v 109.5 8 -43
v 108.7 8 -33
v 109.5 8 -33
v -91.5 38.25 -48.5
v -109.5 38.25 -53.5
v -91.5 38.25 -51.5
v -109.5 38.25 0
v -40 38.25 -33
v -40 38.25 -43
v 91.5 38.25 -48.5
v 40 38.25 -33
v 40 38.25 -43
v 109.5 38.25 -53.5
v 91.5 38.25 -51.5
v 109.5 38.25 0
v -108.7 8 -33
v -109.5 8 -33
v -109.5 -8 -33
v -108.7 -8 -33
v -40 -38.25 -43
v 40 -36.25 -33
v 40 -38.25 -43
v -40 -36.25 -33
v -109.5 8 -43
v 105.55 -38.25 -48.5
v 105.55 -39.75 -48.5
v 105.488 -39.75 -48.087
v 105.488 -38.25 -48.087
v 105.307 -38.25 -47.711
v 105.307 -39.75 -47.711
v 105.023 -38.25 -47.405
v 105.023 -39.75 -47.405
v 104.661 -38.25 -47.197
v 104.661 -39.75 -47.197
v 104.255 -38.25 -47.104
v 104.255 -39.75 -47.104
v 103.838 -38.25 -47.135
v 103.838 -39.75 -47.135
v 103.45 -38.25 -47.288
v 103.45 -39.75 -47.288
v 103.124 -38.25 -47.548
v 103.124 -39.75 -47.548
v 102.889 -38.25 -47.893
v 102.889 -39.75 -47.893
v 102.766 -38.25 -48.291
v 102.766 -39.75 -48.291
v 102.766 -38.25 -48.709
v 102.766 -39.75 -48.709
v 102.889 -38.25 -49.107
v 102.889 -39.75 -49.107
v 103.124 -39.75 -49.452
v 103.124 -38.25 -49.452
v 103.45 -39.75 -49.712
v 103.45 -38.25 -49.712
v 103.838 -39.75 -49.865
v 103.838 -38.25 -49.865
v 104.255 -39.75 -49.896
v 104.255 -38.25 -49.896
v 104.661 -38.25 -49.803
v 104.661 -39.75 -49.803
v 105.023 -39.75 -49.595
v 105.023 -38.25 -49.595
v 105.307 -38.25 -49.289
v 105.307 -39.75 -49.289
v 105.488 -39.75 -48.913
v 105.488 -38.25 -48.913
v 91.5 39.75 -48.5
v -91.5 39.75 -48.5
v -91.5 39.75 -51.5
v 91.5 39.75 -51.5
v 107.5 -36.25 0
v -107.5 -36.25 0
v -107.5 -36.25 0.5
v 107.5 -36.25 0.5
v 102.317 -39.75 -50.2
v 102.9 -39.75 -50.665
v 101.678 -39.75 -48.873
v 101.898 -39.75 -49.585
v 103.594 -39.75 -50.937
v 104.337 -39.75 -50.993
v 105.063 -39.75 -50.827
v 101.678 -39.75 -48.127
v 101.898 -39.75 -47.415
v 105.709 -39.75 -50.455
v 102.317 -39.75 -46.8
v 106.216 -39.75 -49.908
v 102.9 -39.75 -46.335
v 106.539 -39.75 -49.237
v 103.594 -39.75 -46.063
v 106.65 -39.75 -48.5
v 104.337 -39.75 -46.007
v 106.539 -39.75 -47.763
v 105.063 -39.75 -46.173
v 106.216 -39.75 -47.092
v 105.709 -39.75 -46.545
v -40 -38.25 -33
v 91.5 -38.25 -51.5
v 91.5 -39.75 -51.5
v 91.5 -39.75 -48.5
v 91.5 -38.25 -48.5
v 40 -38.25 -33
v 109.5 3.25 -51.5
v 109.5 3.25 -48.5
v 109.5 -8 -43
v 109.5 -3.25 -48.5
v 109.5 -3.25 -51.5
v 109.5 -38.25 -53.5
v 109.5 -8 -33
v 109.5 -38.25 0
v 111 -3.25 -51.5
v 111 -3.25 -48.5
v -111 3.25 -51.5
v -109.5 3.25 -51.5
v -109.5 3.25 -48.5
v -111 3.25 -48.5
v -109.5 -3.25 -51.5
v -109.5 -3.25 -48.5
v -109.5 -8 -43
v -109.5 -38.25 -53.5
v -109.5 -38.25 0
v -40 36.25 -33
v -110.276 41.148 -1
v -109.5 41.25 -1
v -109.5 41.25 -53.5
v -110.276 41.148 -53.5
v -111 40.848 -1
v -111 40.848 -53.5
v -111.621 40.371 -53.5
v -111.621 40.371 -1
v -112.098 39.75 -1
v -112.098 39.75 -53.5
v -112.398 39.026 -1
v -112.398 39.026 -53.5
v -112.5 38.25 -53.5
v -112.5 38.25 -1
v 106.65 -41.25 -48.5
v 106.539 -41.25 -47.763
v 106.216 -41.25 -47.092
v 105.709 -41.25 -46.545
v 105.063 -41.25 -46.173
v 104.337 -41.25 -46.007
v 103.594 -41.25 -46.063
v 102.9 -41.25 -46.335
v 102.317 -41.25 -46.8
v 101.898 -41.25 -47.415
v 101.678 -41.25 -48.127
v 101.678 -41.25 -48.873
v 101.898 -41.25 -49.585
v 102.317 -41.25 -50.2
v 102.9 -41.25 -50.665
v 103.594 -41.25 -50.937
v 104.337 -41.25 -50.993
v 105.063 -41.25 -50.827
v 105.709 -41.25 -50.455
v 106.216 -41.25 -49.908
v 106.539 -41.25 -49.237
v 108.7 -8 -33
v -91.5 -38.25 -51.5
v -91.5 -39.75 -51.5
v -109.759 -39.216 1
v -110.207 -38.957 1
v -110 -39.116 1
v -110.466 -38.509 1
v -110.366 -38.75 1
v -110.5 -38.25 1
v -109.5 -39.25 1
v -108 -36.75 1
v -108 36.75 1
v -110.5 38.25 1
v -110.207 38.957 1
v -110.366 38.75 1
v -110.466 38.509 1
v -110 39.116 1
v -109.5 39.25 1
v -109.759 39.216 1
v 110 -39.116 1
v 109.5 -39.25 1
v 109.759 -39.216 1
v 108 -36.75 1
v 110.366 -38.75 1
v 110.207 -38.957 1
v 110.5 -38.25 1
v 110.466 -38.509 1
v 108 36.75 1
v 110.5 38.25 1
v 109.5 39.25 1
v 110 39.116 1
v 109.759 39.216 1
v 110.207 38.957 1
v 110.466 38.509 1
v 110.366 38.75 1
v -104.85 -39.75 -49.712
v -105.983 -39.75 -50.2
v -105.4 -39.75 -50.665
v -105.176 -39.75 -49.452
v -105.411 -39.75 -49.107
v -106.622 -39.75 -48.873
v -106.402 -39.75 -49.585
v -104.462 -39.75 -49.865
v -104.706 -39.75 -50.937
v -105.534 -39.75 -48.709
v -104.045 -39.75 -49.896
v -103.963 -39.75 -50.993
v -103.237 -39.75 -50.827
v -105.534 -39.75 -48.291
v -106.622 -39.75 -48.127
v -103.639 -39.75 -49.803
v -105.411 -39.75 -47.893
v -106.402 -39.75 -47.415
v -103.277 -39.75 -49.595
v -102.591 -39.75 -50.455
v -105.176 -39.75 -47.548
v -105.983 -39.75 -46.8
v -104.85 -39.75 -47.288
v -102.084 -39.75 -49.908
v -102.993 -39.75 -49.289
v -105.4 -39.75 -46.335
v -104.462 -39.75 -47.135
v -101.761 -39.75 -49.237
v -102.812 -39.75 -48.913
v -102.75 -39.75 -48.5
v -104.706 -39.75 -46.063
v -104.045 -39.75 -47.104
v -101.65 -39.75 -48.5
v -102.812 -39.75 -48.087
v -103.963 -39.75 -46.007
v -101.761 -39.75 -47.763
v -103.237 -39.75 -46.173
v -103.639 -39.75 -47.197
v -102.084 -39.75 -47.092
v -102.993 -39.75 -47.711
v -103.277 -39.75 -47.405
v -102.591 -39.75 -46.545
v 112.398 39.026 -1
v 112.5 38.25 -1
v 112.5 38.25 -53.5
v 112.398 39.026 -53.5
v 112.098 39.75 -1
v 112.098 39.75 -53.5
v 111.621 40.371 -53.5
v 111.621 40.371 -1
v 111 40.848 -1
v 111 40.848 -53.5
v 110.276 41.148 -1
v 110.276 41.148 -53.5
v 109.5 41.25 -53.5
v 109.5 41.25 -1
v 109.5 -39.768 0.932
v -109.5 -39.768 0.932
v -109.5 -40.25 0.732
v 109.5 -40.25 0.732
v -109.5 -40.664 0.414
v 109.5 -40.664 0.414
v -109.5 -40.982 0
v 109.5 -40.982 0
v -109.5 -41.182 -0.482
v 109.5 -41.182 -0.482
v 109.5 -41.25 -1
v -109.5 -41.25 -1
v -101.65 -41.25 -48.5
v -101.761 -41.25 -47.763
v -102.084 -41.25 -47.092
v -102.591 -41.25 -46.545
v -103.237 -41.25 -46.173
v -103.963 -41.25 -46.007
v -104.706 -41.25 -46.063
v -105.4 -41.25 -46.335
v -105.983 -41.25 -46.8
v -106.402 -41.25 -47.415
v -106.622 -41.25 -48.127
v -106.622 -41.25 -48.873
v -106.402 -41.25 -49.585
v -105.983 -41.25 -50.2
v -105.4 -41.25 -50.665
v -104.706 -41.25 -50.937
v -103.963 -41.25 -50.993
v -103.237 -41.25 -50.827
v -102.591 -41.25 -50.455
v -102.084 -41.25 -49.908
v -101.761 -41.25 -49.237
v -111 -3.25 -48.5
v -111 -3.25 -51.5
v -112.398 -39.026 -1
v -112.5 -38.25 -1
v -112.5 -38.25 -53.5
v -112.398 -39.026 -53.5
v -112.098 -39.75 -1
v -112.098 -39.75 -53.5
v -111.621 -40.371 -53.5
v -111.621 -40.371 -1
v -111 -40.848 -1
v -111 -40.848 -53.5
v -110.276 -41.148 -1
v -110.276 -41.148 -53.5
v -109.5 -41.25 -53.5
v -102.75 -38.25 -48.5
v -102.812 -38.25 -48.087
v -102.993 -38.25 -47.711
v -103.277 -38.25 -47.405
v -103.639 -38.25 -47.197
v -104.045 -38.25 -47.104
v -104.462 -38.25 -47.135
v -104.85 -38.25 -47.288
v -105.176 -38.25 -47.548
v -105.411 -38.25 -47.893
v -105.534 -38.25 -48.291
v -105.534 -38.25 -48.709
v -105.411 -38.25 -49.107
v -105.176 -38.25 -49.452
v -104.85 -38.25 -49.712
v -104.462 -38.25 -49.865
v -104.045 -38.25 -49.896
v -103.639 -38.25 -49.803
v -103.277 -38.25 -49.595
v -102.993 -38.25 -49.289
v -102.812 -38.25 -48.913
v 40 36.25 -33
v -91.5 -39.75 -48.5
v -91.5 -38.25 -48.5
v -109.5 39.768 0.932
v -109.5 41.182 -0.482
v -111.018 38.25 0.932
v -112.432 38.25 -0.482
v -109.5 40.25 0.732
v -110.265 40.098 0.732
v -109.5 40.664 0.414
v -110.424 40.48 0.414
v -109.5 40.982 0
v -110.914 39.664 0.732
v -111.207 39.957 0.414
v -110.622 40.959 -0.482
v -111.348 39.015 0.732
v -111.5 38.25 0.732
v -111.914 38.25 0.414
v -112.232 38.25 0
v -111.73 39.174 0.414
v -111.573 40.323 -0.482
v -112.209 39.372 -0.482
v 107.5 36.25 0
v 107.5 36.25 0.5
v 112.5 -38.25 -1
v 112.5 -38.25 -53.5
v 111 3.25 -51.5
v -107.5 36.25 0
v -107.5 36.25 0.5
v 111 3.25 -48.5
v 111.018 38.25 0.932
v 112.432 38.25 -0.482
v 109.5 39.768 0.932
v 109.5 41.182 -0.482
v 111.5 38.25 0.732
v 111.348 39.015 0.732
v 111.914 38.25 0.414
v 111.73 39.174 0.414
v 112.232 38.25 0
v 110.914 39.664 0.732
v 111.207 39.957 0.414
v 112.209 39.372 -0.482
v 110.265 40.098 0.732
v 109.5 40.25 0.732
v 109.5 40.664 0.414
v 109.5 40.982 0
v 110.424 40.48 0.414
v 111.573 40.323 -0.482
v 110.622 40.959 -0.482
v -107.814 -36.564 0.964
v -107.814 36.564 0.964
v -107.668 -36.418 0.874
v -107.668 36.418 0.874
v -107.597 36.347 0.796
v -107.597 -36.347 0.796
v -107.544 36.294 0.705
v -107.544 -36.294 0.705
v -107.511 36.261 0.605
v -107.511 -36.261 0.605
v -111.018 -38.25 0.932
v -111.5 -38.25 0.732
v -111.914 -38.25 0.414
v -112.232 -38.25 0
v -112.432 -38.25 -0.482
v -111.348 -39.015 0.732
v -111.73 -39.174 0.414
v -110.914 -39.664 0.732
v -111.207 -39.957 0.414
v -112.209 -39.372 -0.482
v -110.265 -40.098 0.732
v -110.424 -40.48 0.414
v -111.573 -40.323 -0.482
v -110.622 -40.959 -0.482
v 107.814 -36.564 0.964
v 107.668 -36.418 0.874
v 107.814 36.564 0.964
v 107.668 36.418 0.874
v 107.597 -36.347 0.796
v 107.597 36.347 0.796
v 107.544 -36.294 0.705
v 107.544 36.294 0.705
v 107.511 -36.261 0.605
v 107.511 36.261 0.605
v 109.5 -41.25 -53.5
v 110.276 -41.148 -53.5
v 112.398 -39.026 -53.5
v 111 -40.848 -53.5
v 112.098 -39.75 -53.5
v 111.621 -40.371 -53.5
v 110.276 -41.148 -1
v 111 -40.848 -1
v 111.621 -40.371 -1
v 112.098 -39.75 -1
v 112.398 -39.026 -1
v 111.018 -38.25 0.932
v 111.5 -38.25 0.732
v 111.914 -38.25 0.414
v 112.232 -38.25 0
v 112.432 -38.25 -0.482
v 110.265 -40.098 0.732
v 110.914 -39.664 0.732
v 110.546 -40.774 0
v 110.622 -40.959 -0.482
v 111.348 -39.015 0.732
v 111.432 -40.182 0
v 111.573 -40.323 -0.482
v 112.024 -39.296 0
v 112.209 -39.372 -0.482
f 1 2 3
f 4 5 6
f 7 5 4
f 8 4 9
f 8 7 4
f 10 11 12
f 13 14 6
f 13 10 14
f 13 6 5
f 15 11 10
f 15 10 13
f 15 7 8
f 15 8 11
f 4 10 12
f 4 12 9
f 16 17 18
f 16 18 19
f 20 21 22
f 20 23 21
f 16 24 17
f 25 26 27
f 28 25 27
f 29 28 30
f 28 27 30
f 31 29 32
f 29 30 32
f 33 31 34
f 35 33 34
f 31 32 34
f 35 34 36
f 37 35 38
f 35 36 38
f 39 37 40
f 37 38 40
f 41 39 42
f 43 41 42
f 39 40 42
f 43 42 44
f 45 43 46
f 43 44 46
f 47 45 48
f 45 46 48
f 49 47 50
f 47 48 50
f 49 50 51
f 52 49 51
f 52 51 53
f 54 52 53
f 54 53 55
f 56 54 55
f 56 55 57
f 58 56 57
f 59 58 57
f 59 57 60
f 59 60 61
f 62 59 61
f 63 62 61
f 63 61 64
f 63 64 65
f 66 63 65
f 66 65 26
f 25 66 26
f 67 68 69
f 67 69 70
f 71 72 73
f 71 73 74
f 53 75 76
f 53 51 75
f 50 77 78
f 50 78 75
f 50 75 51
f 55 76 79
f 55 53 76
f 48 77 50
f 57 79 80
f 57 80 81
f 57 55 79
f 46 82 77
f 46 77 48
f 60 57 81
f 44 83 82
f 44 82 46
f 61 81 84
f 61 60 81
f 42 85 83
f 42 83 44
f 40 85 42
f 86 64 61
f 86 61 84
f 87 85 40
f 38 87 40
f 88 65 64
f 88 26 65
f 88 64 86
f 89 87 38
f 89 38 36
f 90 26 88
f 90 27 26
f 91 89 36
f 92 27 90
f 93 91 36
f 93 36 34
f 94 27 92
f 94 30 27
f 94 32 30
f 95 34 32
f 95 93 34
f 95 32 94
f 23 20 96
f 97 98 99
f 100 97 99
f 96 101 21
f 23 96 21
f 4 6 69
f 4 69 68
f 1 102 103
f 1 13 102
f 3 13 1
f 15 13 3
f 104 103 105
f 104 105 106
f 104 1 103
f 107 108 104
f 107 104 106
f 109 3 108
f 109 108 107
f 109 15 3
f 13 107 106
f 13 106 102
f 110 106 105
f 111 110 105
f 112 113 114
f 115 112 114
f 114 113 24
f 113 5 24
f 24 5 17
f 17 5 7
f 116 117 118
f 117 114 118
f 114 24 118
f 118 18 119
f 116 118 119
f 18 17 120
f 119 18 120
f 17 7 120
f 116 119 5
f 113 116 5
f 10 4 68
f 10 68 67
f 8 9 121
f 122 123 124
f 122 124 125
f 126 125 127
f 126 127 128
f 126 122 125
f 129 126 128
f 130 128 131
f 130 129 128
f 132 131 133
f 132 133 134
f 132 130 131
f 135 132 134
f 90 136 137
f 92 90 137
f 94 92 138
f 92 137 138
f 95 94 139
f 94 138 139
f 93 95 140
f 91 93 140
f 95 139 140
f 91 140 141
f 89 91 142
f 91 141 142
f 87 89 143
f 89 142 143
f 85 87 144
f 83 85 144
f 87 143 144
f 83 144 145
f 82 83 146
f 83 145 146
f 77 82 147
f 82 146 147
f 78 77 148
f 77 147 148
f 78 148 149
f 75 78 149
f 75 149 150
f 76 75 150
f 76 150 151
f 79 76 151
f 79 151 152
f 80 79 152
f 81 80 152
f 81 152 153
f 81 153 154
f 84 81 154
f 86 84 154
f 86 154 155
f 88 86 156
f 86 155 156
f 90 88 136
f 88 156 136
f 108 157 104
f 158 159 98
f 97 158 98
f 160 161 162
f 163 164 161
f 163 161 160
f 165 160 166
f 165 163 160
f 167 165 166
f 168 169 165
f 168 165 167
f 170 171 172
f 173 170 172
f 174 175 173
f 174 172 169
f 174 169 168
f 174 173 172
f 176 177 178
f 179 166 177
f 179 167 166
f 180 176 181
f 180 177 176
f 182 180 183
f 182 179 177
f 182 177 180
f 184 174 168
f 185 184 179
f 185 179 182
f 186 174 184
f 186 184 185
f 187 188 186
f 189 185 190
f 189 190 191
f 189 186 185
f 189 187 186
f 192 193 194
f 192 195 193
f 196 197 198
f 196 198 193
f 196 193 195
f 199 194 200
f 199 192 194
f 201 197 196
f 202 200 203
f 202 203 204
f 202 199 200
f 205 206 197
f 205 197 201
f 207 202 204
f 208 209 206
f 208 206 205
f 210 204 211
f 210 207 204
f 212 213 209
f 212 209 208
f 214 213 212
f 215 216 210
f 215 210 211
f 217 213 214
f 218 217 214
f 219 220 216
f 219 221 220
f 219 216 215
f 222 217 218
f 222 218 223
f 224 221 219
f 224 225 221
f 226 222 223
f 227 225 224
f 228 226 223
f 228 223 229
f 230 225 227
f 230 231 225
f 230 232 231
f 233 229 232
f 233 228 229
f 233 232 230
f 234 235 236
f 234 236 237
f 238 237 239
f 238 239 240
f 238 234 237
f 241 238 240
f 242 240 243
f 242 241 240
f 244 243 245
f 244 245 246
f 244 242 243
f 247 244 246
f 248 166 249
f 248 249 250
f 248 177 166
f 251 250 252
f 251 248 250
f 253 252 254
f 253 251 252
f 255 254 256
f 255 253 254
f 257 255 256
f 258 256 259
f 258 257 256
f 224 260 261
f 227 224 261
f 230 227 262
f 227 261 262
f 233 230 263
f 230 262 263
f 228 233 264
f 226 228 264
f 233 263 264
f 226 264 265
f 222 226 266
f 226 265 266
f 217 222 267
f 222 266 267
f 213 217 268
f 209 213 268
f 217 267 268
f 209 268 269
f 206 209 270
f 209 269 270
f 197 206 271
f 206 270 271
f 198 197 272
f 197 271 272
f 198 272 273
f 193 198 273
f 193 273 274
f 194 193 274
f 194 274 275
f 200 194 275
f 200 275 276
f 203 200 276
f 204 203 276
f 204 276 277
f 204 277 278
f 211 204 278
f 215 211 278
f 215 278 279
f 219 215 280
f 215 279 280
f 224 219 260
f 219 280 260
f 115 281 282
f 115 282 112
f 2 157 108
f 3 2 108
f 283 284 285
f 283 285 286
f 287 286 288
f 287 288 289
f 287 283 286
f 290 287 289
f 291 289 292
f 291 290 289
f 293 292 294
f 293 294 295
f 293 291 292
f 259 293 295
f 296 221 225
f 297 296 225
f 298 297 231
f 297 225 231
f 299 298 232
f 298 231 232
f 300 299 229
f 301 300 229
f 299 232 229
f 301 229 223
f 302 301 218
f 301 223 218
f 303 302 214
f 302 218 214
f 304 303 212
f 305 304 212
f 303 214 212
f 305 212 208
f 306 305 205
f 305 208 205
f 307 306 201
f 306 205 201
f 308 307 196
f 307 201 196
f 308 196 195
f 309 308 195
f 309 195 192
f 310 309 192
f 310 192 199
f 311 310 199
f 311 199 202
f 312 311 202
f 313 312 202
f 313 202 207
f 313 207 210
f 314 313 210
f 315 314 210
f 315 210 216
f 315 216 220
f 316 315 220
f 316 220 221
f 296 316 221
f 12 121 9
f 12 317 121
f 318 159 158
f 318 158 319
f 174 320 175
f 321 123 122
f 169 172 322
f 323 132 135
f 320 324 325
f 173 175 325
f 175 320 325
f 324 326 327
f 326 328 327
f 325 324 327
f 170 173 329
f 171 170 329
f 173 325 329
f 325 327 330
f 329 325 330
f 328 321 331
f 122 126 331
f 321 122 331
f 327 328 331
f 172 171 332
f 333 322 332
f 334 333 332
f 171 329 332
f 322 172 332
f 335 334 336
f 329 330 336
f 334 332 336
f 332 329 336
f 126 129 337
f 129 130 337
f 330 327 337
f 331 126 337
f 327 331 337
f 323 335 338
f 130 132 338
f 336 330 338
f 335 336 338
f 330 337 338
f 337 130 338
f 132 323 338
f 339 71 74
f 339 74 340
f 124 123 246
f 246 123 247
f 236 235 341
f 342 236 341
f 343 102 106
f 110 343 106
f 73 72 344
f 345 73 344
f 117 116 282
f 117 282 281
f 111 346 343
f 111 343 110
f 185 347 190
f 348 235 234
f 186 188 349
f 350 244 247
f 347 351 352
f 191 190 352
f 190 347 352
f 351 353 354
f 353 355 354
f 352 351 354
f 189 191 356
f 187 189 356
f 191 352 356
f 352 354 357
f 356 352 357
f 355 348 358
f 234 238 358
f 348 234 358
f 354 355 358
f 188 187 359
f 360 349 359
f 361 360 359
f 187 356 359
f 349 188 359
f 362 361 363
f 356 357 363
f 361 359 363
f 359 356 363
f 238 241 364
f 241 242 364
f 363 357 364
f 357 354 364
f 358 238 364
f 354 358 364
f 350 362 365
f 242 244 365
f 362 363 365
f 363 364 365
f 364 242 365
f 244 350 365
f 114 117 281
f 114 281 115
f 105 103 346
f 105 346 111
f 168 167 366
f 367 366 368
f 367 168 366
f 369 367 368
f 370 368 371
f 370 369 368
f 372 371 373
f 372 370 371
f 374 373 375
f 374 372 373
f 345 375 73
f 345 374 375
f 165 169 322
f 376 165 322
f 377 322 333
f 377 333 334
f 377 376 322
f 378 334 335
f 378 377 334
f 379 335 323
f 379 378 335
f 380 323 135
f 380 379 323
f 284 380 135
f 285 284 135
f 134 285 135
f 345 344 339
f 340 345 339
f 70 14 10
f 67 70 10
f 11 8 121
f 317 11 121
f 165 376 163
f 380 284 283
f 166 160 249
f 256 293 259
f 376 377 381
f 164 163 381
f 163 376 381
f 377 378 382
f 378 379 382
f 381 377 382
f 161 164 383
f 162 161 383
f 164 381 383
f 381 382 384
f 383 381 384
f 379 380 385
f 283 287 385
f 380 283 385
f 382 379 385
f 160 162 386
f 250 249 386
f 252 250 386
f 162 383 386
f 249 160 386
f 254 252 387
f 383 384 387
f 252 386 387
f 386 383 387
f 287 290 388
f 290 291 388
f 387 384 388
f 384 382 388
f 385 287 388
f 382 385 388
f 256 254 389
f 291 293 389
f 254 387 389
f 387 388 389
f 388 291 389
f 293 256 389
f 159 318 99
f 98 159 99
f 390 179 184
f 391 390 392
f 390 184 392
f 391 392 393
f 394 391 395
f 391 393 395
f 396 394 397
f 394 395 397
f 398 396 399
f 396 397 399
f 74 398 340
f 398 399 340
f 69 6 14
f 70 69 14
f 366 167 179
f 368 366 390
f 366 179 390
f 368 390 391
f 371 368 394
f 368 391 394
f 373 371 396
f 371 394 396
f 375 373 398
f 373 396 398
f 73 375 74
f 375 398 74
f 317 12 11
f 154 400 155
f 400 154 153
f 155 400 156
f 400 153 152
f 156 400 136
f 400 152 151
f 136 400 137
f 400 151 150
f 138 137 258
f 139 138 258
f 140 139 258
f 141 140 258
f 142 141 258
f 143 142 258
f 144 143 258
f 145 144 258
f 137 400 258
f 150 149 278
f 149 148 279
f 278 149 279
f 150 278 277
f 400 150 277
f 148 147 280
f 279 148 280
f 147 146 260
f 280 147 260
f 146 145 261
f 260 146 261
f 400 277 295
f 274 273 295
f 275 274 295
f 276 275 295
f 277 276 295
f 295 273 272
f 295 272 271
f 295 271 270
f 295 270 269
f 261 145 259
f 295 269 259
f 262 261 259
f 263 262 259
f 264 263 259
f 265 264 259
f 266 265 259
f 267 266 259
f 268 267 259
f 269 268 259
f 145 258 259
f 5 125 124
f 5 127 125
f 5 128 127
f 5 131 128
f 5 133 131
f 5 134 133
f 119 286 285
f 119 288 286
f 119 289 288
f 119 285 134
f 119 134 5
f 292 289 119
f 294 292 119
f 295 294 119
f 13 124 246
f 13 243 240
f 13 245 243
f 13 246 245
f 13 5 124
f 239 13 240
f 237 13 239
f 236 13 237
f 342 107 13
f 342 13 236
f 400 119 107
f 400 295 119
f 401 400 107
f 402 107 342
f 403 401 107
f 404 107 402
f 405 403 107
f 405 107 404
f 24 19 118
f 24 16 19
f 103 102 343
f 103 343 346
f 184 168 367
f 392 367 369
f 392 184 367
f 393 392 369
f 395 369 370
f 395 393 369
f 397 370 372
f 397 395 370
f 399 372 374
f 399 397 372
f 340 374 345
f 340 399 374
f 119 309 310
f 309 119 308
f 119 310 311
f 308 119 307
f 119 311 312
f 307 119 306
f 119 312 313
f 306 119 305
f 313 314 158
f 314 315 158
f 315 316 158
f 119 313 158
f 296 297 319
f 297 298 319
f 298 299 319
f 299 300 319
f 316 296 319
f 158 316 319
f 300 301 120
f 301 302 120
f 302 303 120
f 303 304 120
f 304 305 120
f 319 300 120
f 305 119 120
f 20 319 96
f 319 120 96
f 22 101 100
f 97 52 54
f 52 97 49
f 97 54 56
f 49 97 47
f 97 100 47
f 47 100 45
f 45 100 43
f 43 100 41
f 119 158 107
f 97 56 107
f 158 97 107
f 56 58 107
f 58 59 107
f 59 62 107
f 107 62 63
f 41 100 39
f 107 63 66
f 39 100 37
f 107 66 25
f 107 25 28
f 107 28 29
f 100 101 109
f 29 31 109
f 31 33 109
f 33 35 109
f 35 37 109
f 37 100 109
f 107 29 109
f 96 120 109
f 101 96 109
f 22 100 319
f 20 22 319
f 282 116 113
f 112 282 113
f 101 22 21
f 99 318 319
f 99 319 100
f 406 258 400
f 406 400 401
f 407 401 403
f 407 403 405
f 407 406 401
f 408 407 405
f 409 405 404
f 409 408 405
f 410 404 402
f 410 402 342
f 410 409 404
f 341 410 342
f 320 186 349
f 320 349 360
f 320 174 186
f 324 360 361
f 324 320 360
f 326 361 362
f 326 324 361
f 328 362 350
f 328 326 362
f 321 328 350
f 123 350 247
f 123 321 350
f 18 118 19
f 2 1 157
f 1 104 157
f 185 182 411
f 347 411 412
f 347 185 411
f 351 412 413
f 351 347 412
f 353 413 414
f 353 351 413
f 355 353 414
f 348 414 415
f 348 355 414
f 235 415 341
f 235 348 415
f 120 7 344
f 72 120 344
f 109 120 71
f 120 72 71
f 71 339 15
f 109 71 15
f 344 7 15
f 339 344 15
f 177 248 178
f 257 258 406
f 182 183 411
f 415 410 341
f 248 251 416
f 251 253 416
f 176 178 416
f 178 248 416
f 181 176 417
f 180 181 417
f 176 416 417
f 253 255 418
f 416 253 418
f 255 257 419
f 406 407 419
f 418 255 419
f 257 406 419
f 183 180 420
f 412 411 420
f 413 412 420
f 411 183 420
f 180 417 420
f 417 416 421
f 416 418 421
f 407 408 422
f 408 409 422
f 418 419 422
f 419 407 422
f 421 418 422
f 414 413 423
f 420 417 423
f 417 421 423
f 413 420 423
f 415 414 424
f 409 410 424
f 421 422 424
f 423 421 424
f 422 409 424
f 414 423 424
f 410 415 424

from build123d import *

# Parameters (mm, degrees)
SKETCH_W        = 215
SKETCH_H        = 72.5
PAD_DEPTH       = 1
SKETCH001_W     = 219
SKETCH001_H     = 76.5
PAD001_DEPTH    = 53.5
FILLET_R        = 2
FILLET001_R     = 0.5
PAD007_DEPTH    = 40
PAD008_DEPTH    = 40
PAD009_DEPTH    = 8
PAD010_DEPTH    = 8
SKETCH034_W     = 183
SKETCH034_H     = 3
POCKET011_DEPTH = 1.5
SKETCH035_R     = 2.5
POCKET012_DEPTH = 1.5
SKETCH036_R     = 1.4
SKETCH036_W     = 183
SKETCH036_H     = 3
POCKET013_DEPTH = 5
SKETCH043_W     = 6.5
SKETCH043_H     = 3
POCKET016_DEPTH = 1.5
SKETCH044_W     = 6.5
SKETCH044_H     = 3
POCKET017_DEPTH = 1.5


with BuildPart() as part:
    # Sketch → Pad (new body)
    with BuildSketch(Plane.XY):
        with BuildLine():
            Line((-112.5, 38.25), (-112.5, -38.25))
            ThreePointArc((-109.5, -41.25), (-111.62132, -40.37132), (-112.5, -38.25))
            Line((-109.5, -41.25), (109.5, -41.25))
            ThreePointArc((112.5, -38.25), (111.62132, -40.37132), (109.5, -41.25))
            Line((112.5, -38.25), (112.5, 38.25))
            ThreePointArc((109.5, 41.25), (111.62132, 40.37132), (112.5, 38.25))
            Line((109.5, 41.25), (-109.5, 41.25))
            ThreePointArc((-112.5, 38.25), (-111.62132, 40.37132), (-109.5, 41.25))
        make_face()
        Rectangle(SKETCH_W, SKETCH_H, mode=Mode.SUBTRACT)
    extrude(amount=PAD_DEPTH)

    # Sketch001 (on Face13 of Pad) → Pad001 (join)
    with BuildSketch(Plane(origin=(0, 0, 0), x_dir=(1, 0, 0), z_dir=(0, 0, -1))):
        with BuildLine():
            Line((109.5, 41.25), (-109.5, 41.25))
            ThreePointArc((-112.5, 38.25), (-111.62132, 40.37132), (-109.5, 41.25))
            Line((-112.5, 38.25), (-112.5, -38.25))
            ThreePointArc((-109.5, -41.25), (-111.62132, -40.37132), (-112.5, -38.25))
            Line((-109.5, -41.25), (109.5, -41.25))
            ThreePointArc((112.5, -38.25), (111.62132, -40.37132), (109.5, -41.25))
            Line((112.5, -38.25), (112.5, 38.25))
            ThreePointArc((109.5, 41.25), (111.62132, 40.37132), (112.5, 38.25))
        make_face()
        Rectangle(SKETCH001_W, SKETCH001_H, mode=Mode.SUBTRACT)
    extrude(amount=PAD001_DEPTH)

    # Fillet
    fillet_edges = [part.edges().sort_by_distance(p)[0] for p in [
        (112.5, 0, 1),
        (111.62132, -40.37132, 1),
        (0, -41.25, 1),
        (111.62132, 40.37132, 1),
        (0, 41.25, 1),
        (-111.62132, 40.37132, 1),
        (-112.5, 0, 1),
        (-111.62132, -40.37132, 1),
    ]]
    fillet(fillet_edges, radius=FILLET_R)

    # Fillet001
    fillet001_edges = [part.edges().sort_by_distance(p)[0] for p in [
        (0, -36.25, 1),
        (107.5, 0, 1),
        (0, 36.25, 1),
        (-107.5, 0, 1),
    ]]
    fillet(fillet001_edges, radius=FILLET001_R)

    # Sketch008 (on DatumPlane) → Pad007 (join, symmetric)
    with BuildSketch(Plane(origin=(0, 38.25, 0), x_dir=(0, 0, 1), z_dir=(1, 0, 0))):
        Polygon((-43, 0), (-33, 0), (-33, 2), align=None)
    extrude(amount=PAD007_DEPTH, both=True)

    # Sketch010 (on DatumPlane) → Pad008 (join, symmetric)
    with BuildSketch(Plane(origin=(0, -38.25, 0), x_dir=(0, 0, 1), z_dir=(-1, 0, 0))):
        Polygon((-43, 0), (-33, 0), (-33, 2), align=None)
    extrude(amount=PAD008_DEPTH, both=True)

    # Sketch012 (on DatumPlane) → Pad009 (join, symmetric)
    with BuildSketch(Plane(origin=(-109.5, 0, 0), x_dir=(0, 0, 1), z_dir=(0, 1, 0))):
        Polygon((-43, 0), (-33, 0), (-33, 0.8), align=None)
    extrude(amount=PAD009_DEPTH, both=True)

    # Sketch014 (on DatumPlane) → Pad010 (join, symmetric)
    with BuildSketch(Plane(origin=(109.5, 0, 0), x_dir=(0, 0, 1), z_dir=(0, -1, 0))):
        Polygon((-33, 0), (-43, 0), (-33, 0.8), align=None)
    extrude(amount=PAD010_DEPTH, both=True)

    # Sketch034 (on Face29 of Pad010) → Pocket011 (cut)
    with BuildSketch(Plane.XZ.offset(-38.25)):
        with Locations((0, -50)):
            Rectangle(SKETCH034_W, SKETCH034_H)
    extrude(amount=-POCKET011_DEPTH, mode=Mode.SUBTRACT)

    # Sketch035 (on Face21 of Pocket011) → Pocket012 (cut)
    with BuildSketch(Plane.XZ.offset(41.25)):
        with Locations((104.15, -48.5)):
            Circle(SKETCH035_R)
        with Locations((-104.15, -48.5)):
            Circle(SKETCH035_R)
    extrude(amount=-POCKET012_DEPTH, mode=Mode.SUBTRACT)

    # Sketch036 (on Face35 of Pocket012) → Pocket013 (cut)
    with BuildSketch(Plane.XZ.offset(39.75)):
        with Locations((104.15, -48.5)):
            Circle(SKETCH036_R)
        with Locations((-104.15, -48.5)):
            Circle(SKETCH036_R)
        with Locations((0, -50)):
            Rectangle(SKETCH036_W, SKETCH036_H)
    extrude(amount=-POCKET013_DEPTH, mode=Mode.SUBTRACT)

    # Sketch043 (on Face32 of Pocket013) → Pocket016 (cut)
    with BuildSketch(Plane(origin=(109.5, 0, 0), x_dir=(0, -1, 0), z_dir=(-1, 0, 0))):
        with Locations((0, -50)):
            Rectangle(SKETCH043_W, SKETCH043_H)
    extrude(amount=-POCKET016_DEPTH, mode=Mode.SUBTRACT)

    # Sketch044 (on Face30 of Pocket016) → Pocket017 (cut)
    with BuildSketch(Plane.YZ.offset(-109.5)):
        with Locations((0, -50)):
            Rectangle(SKETCH044_W, SKETCH044_H)
    extrude(amount=-POCKET017_DEPTH, mode=Mode.SUBTRACT)


solid = part.part
